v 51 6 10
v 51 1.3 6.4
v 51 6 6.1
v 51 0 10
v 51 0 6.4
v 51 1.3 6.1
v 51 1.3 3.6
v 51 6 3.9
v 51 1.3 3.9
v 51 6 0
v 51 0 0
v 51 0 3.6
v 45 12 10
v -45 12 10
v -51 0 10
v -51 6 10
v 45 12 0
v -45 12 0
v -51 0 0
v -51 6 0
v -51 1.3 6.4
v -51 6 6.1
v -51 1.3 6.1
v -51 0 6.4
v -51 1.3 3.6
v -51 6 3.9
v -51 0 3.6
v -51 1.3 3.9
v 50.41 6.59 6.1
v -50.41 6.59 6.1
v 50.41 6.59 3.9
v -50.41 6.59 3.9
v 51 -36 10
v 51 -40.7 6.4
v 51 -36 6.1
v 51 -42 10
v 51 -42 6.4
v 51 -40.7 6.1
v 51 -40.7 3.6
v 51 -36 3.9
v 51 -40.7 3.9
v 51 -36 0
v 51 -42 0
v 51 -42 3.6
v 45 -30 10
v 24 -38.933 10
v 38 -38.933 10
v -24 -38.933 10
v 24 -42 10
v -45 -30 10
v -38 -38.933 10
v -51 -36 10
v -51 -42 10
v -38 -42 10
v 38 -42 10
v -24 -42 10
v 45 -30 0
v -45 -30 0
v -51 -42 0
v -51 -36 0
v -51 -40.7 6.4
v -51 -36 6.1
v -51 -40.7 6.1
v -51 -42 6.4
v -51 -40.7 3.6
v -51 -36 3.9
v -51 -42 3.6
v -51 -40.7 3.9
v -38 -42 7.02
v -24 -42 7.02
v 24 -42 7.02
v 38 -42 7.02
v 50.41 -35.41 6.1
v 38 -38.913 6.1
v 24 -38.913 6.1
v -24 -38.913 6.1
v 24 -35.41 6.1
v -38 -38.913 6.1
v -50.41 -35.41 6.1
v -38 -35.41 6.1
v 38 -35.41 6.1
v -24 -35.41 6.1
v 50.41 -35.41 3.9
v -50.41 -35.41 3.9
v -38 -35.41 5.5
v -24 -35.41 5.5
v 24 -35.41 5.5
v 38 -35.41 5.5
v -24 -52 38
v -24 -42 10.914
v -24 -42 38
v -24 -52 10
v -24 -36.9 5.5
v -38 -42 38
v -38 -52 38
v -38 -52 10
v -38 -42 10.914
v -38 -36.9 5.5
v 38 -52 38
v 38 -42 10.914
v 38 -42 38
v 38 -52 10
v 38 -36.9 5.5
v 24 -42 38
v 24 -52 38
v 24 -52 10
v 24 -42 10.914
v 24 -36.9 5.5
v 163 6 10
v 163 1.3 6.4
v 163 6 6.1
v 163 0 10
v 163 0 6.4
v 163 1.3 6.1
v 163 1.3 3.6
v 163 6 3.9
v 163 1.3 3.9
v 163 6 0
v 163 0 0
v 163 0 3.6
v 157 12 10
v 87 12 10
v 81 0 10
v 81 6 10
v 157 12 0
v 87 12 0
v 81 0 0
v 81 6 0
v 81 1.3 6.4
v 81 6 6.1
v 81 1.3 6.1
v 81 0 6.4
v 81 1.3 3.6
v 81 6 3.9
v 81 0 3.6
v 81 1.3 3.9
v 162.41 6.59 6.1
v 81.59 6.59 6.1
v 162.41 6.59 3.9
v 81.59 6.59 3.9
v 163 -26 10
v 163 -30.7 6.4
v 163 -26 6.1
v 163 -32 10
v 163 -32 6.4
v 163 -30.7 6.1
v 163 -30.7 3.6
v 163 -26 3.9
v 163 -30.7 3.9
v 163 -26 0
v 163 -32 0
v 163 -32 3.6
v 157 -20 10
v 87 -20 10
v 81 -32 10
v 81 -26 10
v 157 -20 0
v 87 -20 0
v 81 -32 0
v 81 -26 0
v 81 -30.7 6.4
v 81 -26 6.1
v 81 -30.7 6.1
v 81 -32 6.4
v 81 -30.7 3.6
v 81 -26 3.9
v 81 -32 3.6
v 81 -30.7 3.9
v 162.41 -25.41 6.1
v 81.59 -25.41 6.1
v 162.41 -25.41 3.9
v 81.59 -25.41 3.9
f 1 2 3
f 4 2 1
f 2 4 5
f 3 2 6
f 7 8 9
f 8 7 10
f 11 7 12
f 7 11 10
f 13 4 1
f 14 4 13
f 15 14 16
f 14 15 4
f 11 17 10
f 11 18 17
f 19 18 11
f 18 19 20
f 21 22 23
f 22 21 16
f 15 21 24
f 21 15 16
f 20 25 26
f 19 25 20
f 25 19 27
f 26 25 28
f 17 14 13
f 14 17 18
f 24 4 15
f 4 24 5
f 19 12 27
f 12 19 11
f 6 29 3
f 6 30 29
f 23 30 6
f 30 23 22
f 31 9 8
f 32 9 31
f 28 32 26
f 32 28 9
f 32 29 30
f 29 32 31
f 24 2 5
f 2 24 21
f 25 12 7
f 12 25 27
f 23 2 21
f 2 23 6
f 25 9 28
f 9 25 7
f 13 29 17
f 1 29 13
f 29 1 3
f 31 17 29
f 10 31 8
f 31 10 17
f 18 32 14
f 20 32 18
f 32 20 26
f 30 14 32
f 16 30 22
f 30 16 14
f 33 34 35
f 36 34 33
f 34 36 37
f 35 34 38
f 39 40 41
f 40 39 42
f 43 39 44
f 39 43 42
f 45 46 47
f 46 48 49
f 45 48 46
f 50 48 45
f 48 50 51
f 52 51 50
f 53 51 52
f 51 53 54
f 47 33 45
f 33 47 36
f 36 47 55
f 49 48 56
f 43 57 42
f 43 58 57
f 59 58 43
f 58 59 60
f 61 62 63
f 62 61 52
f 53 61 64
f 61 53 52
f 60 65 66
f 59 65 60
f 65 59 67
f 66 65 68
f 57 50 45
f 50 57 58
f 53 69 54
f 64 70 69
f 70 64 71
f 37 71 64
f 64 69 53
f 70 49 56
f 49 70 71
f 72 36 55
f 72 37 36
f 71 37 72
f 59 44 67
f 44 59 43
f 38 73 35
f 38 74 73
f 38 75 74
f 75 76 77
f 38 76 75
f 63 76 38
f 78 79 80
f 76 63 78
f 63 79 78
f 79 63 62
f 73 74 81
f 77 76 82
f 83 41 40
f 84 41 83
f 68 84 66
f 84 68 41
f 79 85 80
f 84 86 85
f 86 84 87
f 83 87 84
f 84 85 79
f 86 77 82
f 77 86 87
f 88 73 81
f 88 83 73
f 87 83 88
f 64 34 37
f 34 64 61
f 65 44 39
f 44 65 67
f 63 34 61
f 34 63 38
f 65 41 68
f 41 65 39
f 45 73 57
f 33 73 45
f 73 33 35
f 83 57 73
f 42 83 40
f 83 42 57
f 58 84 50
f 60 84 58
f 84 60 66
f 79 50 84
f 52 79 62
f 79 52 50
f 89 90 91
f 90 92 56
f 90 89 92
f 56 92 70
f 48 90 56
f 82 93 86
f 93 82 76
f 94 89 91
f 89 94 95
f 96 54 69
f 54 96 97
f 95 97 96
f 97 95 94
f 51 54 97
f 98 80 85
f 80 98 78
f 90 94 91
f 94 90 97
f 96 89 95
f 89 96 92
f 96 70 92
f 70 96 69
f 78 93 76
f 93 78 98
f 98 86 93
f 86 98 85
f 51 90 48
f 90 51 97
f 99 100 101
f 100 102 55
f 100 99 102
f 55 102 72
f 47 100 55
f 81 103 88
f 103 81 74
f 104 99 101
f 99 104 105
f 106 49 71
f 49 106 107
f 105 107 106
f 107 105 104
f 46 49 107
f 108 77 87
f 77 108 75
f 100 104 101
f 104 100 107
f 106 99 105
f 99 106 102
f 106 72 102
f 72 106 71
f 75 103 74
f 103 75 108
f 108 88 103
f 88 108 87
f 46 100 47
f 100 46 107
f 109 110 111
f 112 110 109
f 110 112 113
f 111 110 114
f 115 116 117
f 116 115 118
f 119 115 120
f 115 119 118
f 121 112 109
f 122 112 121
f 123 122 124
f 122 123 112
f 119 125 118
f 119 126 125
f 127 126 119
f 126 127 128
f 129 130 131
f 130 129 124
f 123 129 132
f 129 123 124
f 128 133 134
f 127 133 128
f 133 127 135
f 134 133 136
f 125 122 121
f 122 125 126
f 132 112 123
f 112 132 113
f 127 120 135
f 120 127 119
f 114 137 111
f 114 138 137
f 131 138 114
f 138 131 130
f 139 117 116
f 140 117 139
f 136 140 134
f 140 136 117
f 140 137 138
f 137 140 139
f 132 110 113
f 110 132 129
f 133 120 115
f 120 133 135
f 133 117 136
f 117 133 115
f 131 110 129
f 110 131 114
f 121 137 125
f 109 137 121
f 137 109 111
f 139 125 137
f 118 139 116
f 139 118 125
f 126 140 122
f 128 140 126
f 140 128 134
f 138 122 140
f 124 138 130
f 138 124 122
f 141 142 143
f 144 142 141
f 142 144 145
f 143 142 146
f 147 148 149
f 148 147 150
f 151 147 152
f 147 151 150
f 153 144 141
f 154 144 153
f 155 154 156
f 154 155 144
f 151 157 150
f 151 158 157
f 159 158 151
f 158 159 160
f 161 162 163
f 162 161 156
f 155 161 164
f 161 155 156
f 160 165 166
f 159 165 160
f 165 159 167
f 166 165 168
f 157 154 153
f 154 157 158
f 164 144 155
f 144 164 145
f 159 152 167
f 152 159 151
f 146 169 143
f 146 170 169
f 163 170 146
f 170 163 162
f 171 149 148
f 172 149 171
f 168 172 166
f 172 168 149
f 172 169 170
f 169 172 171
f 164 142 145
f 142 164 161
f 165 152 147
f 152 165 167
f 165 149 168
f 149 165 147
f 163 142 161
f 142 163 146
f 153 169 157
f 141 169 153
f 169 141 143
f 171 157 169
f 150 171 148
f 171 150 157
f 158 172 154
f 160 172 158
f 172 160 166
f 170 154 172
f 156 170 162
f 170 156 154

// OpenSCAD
// 4-piece PCB picture-frame rails (mitered) + print plate layout (no intersections)
// PCB: 90 x 70 x 1.5 mm
// Units: mm

// ---------------- PCB ----------------
pcb_x  = 90;
pcb_y  = 70;
pcb_t  = 1.5;

// ---------------- Rail cross-section ----------------
// Local rail coords:
// - Length along X
// - Inner edge at Y=0 (touches PCB edge), rail extends to +Y (outside border)
// - Thickness along Z, centered at Z=0
rail_w = 12.0;   // border width (Y)
rail_z = 10.0;   // thickness (Z)

// ---------------- Channel (correct axis) ----------------
slot_clear = 0.35;
slot_z     = pcb_t + 2*slot_clear; // captures PCB thickness (Z)
slot_depth = 6.5;                  // seats inward from inner edge (Y)

// keep some material above/below slot in Z
slot_z_center = 0; // center the slot in Z (simple)

// ---------------- Miters ----------------
miter_deg = 45;

// ---------------- Legs (optional, bottom rail only) ----------------
legs_enable = true;
leg_w   = 14.0;
leg_th  = 3.0;
leg_len = 28.0;
leg_drop= 10.0;
leg_inset = 20.0;

// ---------------- Output ----------------
mode = "print_plate"; // "print_plate", "assembly_preview", "top","bottom","left","right"

// ---------------- Derived rail lengths for square mitered frame ----------------
// For a classic mitered frame, each rail overall length = inner_span + rail_w
Lx = pcb_x + rail_w;
Ly = pcb_y + rail_w;

// ---------------- Core rail geometry ----------------
module rail_block(L){
  // Rail is a rectangular prism: length L in X, width rail_w in Y (from 0..rail_w), thickness rail_z in Z
  translate([0, rail_w/2, 0]) cube([L, rail_w, rail_z], center=true);
}

module rail_with_channel(L){
  difference(){
    rail_block(L);

    // Channel: open at inner edge (Y=0), extends inward +Y by slot_depth,
    // and has height slot_z in Z (captures PCB thickness).
    // Make it protrude past Y=0 so it's truly open.
    translate([0, slot_depth/2 - 0.01, slot_z_center])
      cube([L+1, slot_depth+0.2, slot_z], center=true);

    // Slightly flared mouth for easier insertion
    translate([0, 0.6, slot_z_center])
      cube([L+1, 1.4, slot_z+0.6], center=true);
  }
}

module miter_cut(L, end=+1){
  // Cut a 45° miter that produces a square outer corner when assembled.
  // We subtract a large rotated block at each end.
  // end=+1 => +X end, end=-1 => -X end
  translate([end*(L/2), rail_w/2, 0])
    rotate([0,0,end*miter_deg])
      translate([end*80, 0, 0])
        cube([160, rail_w*4, rail_z*4], center=true);
}

module rail_part(L, is_bottom=false){
  difference(){
    rail_with_channel(L);

    // Miters on both ends
    miter_cut(L, end=+1);
    miter_cut(L, end=-1);
  }

  // Simple legs on bottom rail only (optional)
  if (is_bottom && legs_enable){
    for (sx=[-1,1]){
      x = sx*(L/2 - leg_inset);
      // rear foot in +Z
      translate([x, -leg_drop/2, rail_z/2 + leg_len/2])
        cube([leg_w, leg_drop, leg_len], center=true);

      // brace
      hull(){
        translate([x, rail_w*0.55, rail_z*0.20])
          cube([leg_w, leg_th, leg_th], center=true);
        translate([x, -leg_drop + leg_th/2, rail_z/2 + leg_th/2])
          cube([leg_w, leg_th, leg_th], center=true);
      }
    }
  }
}

// Named parts
module top_rail()    { rail_part(Lx, is_bottom=false); }
module bottom_rail() { rail_part(Lx, is_bottom=true ); }
module left_rail()   { rail_part(Ly, is_bottom=false); }
module right_rail()  { rail_part(Ly, is_bottom=false); }

// ---------------- Assembly preview (optional) ----------------
module assembly_preview(){
  // PCB preview
  color([0,0.6,0,0.35]) translate([0,0,0]) cube([pcb_x, pcb_y, pcb_t], center=true);

  // Rails around PCB edges (inner edge Y=0 must touch PCB boundary)
  // Place and rotate so each rail's inner edge faces inward.

  // Top: inner edge should face downward (toward -Y), so rotate 180° about Z and place at +pcb_y/2
  translate([0, +pcb_y/2, 0]) rotate([0,0,180]) top_rail();

  // Bottom: inner edge should face upward (toward +Y), place at -pcb_y/2 (no rotation needed)
  translate([0, -pcb_y/2, 0]) bottom_rail();

  // Right: rotate -90 so rail length runs along Y, inner edge faces left (-X), place at +pcb_x/2
  translate([+pcb_x/2, 0, 0]) rotate([0,0,-90]) right_rail();

  // Left: rotate +90 so inner edge faces right (+X), place at -pcb_x/2
  translate([-pcb_x/2, 0, 0]) rotate([0,0, 90]) left_rail();
}

// ---------------- Print plate layout (guaranteed non-overlap) ----------------
module print_plate(){
  // Lay out 4 parts separated. All parts are centered at Z=0; lift by rail_z/2 to sit on bed.
  zlift = rail_z/2;

  gap = 20; // extra spacing between bounding boxes

  // Bounding box sizes (conservative):
  // Long rail bbox: [Lx, rail_w + legs? (in Y), rail_z + legs? (in Z)]
  // We only separate in X/Y, so use footprint sizes:
  long_x = Lx;
  short_x= Ly;
  foot_y = rail_w + (legs_enable ? leg_drop : 0); // bottom rail footprint extends into -Y by leg_drop
  plain_y= rail_w;

  // Place in a 2x2 grid with generous gaps
  // Row 1: top + bottom
  translate([0, 0, zlift])                     top_rail();
  translate([0, -(max(plain_y,foot_y)+gap), zlift]) bottom_rail();

  // Row 2: left + right, shifted in X so no overlap with row 1 parts
  xshift = max(long_x, short_x) + gap;
  translate([xshift, 0, zlift])                left_rail();
  translate([xshift, -(plain_y+gap), zlift])   right_rail();
}

// ---------------- Switch ----------------
if (mode=="print_plate")        print_plate();
else if (mode=="assembly_preview") assembly_preview();
else if (mode=="top")           top_rail();
else if (mode=="bottom")        bottom_rail();
else if (mode=="left")          left_rail();
else if (mode=="right")         right_rail();
